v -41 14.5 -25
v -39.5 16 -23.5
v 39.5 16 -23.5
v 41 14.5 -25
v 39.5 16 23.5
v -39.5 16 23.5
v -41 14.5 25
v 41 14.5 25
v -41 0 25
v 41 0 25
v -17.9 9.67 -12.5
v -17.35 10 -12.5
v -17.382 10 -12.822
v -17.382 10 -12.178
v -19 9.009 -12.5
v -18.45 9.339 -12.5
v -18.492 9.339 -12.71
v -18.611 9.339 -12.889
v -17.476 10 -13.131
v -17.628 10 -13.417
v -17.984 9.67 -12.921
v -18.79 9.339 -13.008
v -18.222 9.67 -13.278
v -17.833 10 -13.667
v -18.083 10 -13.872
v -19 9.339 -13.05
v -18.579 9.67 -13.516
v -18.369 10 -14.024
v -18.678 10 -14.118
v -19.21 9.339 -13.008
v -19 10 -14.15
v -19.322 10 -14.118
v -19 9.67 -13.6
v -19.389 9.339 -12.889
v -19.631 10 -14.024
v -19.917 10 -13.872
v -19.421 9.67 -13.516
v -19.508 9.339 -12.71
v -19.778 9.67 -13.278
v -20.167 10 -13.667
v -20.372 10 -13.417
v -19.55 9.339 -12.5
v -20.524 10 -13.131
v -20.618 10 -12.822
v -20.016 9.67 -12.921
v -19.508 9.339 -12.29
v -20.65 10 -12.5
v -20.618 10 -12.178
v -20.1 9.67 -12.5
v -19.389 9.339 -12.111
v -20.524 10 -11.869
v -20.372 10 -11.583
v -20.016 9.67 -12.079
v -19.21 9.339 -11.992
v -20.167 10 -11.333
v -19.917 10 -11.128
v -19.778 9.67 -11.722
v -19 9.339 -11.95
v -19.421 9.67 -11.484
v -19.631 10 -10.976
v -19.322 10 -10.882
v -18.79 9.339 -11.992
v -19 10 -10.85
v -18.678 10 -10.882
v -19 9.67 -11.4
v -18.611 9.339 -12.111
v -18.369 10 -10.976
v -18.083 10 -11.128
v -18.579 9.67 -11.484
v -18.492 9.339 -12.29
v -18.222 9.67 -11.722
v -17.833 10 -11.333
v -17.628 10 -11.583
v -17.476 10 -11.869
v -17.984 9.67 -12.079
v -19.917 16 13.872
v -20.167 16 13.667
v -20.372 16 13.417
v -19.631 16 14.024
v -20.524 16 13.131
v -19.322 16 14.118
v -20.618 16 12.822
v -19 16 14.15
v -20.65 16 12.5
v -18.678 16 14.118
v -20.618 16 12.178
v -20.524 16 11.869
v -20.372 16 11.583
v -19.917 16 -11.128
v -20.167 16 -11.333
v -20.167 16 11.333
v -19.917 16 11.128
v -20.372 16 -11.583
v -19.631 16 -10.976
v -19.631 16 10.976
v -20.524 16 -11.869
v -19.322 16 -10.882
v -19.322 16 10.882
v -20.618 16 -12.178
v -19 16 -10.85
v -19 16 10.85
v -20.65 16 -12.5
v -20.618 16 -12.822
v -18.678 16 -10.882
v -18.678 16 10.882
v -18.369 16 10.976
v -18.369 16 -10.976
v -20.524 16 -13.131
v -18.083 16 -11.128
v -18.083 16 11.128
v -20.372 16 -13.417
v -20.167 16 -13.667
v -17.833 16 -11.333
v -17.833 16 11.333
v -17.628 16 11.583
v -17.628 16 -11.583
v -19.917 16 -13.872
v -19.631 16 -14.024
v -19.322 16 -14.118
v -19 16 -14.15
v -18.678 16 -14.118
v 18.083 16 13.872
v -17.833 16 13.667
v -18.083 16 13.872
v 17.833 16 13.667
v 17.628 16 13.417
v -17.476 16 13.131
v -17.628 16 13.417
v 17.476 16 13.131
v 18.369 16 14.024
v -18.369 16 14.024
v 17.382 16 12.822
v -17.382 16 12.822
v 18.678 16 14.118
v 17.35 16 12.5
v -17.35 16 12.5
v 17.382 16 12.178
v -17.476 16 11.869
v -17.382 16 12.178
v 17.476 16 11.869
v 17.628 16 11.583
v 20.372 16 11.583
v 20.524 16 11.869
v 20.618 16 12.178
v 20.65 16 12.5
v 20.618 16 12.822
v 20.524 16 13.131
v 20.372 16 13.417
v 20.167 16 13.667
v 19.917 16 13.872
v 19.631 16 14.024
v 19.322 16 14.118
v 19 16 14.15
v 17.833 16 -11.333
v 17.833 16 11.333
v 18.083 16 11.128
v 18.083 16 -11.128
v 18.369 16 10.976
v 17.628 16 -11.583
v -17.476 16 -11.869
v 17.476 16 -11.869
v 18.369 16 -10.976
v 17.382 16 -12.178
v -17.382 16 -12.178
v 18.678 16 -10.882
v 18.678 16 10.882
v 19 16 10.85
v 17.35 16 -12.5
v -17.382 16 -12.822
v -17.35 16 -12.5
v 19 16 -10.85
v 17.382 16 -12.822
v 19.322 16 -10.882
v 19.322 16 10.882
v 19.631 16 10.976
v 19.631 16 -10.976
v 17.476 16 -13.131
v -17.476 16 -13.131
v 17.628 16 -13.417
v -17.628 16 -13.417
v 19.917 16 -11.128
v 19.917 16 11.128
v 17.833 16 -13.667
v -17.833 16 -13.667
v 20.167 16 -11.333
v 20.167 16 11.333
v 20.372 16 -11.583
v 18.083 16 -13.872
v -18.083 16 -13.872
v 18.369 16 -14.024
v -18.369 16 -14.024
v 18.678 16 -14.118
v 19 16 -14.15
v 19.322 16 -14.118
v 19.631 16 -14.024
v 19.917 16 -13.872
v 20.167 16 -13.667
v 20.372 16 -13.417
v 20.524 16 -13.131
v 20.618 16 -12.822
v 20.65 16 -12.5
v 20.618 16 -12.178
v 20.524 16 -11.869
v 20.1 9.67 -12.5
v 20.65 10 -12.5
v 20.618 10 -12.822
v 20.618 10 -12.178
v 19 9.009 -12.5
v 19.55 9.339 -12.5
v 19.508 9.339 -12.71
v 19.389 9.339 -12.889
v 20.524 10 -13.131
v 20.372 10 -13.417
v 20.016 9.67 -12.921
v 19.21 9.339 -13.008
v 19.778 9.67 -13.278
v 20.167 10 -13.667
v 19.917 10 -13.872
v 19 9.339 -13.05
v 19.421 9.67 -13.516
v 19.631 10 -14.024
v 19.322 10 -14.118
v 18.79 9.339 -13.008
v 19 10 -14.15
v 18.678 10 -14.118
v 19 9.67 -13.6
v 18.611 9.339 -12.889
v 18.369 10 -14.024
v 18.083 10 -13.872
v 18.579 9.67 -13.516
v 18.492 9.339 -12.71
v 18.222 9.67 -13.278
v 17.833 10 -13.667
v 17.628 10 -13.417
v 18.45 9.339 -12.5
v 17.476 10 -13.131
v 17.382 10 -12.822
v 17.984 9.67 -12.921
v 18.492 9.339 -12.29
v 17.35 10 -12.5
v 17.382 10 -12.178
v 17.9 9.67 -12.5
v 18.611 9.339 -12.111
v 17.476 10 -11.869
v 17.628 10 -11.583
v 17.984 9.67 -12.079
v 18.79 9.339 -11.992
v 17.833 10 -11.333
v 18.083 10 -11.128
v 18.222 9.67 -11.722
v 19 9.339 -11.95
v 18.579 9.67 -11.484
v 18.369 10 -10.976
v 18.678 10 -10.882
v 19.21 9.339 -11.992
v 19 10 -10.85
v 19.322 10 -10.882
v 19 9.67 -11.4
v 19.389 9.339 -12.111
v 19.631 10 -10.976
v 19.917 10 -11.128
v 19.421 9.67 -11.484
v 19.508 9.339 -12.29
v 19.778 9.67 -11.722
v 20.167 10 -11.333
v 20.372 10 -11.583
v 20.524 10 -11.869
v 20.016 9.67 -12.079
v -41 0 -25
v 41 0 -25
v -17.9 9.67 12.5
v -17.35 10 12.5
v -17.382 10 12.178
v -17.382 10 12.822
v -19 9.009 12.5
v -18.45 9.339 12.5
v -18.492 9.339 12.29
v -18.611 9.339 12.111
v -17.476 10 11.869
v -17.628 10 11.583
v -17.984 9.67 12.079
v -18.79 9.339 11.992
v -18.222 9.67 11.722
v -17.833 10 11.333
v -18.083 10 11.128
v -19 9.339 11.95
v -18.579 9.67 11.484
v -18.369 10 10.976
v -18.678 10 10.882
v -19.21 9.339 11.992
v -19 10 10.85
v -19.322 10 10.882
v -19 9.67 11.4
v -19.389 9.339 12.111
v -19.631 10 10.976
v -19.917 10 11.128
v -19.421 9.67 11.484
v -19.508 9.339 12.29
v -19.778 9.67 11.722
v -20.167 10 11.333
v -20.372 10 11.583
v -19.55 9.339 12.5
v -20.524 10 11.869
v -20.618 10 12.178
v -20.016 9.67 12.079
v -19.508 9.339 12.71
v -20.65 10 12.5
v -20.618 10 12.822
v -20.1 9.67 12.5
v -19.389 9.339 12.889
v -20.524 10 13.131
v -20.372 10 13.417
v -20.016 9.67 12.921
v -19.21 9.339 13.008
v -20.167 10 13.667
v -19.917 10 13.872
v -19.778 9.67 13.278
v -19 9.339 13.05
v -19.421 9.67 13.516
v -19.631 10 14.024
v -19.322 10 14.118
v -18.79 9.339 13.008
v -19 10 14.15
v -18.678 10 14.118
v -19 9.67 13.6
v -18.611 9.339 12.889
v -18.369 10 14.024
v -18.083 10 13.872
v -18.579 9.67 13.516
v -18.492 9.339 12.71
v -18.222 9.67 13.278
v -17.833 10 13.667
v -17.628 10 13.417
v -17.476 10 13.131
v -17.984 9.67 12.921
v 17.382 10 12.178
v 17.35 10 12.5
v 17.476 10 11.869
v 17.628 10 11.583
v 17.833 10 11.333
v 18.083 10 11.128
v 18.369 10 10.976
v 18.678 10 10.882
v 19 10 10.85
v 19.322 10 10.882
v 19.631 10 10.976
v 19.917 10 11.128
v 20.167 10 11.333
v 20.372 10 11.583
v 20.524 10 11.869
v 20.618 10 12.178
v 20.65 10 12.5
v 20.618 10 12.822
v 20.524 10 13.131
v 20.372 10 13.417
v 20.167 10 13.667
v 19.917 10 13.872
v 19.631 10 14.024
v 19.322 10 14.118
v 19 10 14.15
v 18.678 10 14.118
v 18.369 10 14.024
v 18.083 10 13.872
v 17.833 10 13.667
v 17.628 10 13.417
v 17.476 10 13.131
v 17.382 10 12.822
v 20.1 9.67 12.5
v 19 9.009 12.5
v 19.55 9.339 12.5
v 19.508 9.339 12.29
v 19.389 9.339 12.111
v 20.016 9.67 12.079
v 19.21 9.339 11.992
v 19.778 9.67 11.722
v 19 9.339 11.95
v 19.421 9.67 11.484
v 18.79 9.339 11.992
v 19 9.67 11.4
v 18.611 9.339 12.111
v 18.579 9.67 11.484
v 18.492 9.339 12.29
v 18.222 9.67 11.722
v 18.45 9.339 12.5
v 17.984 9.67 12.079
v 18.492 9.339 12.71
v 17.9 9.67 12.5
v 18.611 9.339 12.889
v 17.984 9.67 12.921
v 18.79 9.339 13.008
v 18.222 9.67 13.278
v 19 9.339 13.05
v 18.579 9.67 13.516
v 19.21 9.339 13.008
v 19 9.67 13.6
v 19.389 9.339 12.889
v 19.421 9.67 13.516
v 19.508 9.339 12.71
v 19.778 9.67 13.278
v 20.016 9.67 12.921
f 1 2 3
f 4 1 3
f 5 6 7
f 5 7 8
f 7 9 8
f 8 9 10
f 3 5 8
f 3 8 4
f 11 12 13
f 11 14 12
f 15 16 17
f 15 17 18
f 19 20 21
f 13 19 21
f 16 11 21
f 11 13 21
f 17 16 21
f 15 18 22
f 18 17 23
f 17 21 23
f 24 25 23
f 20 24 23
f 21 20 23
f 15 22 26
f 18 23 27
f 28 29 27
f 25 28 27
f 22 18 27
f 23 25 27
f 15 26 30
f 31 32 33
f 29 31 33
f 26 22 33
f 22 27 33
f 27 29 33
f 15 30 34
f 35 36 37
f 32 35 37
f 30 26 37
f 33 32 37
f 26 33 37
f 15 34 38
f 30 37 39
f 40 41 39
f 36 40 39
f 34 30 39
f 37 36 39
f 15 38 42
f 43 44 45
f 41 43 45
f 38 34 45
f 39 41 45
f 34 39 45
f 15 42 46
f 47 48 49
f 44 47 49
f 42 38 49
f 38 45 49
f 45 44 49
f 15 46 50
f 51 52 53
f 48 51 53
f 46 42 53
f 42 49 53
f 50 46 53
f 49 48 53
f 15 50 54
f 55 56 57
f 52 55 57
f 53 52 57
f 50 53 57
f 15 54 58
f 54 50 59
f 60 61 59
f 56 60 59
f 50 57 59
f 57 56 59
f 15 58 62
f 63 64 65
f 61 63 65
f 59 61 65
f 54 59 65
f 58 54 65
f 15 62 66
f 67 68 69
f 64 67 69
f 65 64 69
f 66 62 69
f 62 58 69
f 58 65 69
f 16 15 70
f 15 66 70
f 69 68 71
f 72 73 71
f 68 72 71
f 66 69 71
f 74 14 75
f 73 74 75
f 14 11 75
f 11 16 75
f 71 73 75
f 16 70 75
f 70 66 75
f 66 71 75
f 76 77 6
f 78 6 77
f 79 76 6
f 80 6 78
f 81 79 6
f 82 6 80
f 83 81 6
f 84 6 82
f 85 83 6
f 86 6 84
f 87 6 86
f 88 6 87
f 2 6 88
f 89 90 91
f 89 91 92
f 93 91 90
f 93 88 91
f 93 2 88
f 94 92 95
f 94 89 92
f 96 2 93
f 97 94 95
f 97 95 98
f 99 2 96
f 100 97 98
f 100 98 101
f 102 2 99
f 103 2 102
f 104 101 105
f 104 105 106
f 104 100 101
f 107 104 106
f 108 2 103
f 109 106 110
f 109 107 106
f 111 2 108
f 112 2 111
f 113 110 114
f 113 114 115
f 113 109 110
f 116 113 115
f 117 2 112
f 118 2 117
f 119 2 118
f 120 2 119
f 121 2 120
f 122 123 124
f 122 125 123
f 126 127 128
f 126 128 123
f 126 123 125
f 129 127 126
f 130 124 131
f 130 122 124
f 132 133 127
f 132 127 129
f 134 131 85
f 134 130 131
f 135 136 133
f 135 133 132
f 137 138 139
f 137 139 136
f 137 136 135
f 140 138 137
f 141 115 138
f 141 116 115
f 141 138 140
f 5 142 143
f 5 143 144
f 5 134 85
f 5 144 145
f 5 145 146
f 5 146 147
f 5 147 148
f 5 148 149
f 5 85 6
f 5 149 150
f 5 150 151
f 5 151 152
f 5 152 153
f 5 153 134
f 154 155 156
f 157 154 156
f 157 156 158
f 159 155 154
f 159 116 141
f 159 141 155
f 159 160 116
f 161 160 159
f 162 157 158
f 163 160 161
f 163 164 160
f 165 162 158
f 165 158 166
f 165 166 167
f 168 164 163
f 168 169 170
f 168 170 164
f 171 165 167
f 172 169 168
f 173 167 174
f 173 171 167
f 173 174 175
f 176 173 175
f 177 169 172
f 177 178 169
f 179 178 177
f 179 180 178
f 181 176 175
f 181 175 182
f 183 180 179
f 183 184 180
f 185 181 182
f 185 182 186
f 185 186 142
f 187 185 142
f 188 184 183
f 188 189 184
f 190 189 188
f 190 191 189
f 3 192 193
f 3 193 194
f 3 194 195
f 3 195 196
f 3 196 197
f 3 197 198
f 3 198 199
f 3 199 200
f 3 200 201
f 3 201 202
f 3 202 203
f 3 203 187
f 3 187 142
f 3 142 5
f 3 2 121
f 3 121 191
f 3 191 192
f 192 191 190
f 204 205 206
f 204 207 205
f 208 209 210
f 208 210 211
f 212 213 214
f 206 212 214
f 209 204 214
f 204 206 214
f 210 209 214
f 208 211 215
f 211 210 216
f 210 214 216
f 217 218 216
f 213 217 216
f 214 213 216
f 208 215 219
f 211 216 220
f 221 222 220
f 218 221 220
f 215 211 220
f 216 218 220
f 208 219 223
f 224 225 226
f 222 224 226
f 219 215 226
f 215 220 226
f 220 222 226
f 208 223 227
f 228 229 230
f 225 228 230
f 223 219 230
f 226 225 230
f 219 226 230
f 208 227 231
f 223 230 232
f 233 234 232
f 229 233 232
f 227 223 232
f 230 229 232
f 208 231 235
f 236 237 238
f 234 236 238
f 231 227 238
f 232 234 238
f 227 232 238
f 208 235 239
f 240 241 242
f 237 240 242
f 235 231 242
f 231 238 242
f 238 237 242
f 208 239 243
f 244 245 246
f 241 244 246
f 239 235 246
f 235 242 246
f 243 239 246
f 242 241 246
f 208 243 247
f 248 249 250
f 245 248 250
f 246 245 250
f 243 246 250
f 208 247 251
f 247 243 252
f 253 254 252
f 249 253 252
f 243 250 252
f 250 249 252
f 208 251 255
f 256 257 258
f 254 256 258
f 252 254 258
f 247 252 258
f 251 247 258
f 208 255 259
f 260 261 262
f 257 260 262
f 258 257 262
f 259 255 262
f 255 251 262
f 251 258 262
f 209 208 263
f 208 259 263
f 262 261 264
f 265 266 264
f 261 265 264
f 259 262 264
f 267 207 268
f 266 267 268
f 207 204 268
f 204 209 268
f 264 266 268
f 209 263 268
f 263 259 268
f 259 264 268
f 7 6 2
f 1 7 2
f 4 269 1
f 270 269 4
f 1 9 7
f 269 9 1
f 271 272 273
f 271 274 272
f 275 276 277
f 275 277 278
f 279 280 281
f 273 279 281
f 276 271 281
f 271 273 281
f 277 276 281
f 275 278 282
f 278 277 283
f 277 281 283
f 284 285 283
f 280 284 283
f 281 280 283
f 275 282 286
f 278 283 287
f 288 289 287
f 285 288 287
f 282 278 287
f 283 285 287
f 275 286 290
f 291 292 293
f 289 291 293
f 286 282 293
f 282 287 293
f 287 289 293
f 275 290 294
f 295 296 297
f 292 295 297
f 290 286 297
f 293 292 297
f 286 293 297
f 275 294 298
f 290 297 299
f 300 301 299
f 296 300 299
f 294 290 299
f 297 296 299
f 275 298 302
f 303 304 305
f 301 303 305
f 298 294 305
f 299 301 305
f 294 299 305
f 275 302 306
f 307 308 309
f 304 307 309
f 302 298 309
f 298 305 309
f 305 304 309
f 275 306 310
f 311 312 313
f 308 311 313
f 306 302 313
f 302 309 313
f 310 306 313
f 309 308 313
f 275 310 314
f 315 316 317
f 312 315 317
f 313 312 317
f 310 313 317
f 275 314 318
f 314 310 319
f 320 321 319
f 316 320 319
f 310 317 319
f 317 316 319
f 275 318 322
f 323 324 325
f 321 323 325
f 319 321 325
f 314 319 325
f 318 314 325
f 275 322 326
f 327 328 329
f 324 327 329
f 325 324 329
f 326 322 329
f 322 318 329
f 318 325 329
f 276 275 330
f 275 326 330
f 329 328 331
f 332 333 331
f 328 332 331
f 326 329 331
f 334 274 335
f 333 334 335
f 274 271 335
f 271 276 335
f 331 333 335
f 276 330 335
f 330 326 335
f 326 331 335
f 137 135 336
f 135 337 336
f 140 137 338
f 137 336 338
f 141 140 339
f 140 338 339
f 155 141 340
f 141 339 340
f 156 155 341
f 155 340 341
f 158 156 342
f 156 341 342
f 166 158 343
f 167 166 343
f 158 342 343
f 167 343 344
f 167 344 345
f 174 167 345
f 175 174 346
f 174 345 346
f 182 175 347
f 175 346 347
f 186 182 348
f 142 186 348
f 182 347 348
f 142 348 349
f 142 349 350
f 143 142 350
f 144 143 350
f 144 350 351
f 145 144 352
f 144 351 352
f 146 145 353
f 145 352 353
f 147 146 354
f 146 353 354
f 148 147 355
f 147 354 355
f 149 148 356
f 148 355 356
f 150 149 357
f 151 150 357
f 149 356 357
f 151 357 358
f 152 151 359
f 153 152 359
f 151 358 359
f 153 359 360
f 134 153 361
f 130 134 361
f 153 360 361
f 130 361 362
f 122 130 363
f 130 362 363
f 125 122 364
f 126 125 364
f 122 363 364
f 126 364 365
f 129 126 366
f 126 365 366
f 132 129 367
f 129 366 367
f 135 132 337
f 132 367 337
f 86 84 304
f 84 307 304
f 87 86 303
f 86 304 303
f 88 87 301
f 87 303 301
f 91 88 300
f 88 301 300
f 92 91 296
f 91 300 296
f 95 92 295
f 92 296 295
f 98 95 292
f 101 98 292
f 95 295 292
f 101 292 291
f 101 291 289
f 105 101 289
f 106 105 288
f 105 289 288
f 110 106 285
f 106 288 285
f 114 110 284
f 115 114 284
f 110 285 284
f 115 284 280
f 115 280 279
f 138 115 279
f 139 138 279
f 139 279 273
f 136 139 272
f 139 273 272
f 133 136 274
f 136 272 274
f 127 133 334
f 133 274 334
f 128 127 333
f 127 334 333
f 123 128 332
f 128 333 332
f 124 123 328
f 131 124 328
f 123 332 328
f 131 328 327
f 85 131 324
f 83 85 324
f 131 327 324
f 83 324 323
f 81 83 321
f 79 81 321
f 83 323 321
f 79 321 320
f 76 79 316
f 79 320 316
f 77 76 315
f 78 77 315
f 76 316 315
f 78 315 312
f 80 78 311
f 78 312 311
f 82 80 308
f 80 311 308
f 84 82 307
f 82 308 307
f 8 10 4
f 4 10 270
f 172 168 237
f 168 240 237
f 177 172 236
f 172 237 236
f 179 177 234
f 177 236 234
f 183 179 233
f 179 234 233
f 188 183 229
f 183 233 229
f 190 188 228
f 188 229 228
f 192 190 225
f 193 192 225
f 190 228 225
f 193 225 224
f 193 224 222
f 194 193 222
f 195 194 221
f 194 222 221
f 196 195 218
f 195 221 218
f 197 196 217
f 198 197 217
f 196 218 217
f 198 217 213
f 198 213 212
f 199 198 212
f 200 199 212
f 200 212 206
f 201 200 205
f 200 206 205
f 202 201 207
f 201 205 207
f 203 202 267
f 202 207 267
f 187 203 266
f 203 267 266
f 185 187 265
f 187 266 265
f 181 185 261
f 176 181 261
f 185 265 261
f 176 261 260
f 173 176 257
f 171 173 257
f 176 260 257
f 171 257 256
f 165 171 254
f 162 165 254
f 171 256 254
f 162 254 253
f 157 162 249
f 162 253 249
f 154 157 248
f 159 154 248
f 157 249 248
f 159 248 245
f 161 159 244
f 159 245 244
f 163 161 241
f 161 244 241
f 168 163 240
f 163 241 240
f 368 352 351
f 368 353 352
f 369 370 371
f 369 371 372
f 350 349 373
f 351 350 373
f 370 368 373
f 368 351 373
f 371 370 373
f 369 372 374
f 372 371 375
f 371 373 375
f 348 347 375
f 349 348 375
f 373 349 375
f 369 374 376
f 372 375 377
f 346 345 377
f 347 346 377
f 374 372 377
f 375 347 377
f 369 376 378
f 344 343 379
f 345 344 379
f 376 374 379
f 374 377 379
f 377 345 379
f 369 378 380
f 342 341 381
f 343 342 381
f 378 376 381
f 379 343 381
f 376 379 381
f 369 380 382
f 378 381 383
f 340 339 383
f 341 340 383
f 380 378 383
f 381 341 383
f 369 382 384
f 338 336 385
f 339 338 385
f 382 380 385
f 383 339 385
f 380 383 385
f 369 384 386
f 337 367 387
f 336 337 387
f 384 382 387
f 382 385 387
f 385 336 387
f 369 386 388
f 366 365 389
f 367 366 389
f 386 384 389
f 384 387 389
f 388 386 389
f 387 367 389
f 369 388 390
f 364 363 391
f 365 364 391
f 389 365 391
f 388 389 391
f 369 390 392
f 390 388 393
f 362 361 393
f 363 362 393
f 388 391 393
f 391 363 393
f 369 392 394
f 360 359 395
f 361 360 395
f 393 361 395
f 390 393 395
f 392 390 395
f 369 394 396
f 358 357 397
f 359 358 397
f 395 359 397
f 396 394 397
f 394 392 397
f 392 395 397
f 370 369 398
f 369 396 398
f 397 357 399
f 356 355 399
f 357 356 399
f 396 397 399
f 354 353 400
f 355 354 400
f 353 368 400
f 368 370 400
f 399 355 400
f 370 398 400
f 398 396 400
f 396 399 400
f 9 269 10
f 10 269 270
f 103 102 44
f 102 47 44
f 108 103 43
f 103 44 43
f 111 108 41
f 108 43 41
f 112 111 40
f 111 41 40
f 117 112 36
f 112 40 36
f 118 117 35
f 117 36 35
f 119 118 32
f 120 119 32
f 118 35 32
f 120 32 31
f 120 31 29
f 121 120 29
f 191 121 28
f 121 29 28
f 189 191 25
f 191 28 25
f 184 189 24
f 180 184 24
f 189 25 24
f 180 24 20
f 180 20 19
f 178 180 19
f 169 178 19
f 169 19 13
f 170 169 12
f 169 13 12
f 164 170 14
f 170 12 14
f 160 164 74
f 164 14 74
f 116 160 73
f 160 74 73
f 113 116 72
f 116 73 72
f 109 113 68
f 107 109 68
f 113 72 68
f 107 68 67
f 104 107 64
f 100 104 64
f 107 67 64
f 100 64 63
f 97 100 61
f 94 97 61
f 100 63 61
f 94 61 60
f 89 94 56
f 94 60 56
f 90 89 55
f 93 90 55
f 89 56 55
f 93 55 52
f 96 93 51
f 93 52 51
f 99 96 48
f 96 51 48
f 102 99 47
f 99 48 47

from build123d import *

# Parameters (mm, degrees)
SKETCH1_W             = 82
SKETCH1_H             = 50
BOSS_EXTRUDE1_DEPTH   = 16
CHAMFER1_SIZE         = 1.5
M4_TAPPED_HOLE1_D     = 3.3
M4_TAPPED_HOLE1_DEPTH = 6
M4_TAPPED_HOLE1_TIP   = 0.991420021


with BuildPart() as part:
    # Sketch1 → Boss-Extrude1 (new body)
    with BuildSketch(Plane(origin=(0, 0, 0), x_dir=(1, 0, 0), z_dir=(0, 1, 0))):
        Rectangle(SKETCH1_W, SKETCH1_H)
    extrude(amount=BOSS_EXTRUDE1_DEPTH)

    # Chamfer1
    chamfer1_edges = [part.edges().sort_by_distance(p)[0] for p in [
        (41, 16, 0),
        (0, 16, -25),
        (-41, 16, 0),
        (0, 16, 25),
    ]]
    chamfer(chamfer1_edges, length=CHAMFER1_SIZE)

    # M4 Tapped Hole1
    with Locations(Plane(origin=(0, 16, 0), x_dir=(1, 0, 0), z_dir=(0, 1, 0))):
        with Locations((-19, 12.5), (19, 12.5), (19, -12.5), (-19, -12.5)):
            Hole(M4_TAPPED_HOLE1_D / 2, depth=M4_TAPPED_HOLE1_DEPTH)
            with Locations((0, 0, -(M4_TAPPED_HOLE1_DEPTH + M4_TAPPED_HOLE1_TIP / 2))):  # 118° drill point
                Cone(0, M4_TAPPED_HOLE1_D / 2, M4_TAPPED_HOLE1_TIP, mode=Mode.SUBTRACT)


solid = part.part
